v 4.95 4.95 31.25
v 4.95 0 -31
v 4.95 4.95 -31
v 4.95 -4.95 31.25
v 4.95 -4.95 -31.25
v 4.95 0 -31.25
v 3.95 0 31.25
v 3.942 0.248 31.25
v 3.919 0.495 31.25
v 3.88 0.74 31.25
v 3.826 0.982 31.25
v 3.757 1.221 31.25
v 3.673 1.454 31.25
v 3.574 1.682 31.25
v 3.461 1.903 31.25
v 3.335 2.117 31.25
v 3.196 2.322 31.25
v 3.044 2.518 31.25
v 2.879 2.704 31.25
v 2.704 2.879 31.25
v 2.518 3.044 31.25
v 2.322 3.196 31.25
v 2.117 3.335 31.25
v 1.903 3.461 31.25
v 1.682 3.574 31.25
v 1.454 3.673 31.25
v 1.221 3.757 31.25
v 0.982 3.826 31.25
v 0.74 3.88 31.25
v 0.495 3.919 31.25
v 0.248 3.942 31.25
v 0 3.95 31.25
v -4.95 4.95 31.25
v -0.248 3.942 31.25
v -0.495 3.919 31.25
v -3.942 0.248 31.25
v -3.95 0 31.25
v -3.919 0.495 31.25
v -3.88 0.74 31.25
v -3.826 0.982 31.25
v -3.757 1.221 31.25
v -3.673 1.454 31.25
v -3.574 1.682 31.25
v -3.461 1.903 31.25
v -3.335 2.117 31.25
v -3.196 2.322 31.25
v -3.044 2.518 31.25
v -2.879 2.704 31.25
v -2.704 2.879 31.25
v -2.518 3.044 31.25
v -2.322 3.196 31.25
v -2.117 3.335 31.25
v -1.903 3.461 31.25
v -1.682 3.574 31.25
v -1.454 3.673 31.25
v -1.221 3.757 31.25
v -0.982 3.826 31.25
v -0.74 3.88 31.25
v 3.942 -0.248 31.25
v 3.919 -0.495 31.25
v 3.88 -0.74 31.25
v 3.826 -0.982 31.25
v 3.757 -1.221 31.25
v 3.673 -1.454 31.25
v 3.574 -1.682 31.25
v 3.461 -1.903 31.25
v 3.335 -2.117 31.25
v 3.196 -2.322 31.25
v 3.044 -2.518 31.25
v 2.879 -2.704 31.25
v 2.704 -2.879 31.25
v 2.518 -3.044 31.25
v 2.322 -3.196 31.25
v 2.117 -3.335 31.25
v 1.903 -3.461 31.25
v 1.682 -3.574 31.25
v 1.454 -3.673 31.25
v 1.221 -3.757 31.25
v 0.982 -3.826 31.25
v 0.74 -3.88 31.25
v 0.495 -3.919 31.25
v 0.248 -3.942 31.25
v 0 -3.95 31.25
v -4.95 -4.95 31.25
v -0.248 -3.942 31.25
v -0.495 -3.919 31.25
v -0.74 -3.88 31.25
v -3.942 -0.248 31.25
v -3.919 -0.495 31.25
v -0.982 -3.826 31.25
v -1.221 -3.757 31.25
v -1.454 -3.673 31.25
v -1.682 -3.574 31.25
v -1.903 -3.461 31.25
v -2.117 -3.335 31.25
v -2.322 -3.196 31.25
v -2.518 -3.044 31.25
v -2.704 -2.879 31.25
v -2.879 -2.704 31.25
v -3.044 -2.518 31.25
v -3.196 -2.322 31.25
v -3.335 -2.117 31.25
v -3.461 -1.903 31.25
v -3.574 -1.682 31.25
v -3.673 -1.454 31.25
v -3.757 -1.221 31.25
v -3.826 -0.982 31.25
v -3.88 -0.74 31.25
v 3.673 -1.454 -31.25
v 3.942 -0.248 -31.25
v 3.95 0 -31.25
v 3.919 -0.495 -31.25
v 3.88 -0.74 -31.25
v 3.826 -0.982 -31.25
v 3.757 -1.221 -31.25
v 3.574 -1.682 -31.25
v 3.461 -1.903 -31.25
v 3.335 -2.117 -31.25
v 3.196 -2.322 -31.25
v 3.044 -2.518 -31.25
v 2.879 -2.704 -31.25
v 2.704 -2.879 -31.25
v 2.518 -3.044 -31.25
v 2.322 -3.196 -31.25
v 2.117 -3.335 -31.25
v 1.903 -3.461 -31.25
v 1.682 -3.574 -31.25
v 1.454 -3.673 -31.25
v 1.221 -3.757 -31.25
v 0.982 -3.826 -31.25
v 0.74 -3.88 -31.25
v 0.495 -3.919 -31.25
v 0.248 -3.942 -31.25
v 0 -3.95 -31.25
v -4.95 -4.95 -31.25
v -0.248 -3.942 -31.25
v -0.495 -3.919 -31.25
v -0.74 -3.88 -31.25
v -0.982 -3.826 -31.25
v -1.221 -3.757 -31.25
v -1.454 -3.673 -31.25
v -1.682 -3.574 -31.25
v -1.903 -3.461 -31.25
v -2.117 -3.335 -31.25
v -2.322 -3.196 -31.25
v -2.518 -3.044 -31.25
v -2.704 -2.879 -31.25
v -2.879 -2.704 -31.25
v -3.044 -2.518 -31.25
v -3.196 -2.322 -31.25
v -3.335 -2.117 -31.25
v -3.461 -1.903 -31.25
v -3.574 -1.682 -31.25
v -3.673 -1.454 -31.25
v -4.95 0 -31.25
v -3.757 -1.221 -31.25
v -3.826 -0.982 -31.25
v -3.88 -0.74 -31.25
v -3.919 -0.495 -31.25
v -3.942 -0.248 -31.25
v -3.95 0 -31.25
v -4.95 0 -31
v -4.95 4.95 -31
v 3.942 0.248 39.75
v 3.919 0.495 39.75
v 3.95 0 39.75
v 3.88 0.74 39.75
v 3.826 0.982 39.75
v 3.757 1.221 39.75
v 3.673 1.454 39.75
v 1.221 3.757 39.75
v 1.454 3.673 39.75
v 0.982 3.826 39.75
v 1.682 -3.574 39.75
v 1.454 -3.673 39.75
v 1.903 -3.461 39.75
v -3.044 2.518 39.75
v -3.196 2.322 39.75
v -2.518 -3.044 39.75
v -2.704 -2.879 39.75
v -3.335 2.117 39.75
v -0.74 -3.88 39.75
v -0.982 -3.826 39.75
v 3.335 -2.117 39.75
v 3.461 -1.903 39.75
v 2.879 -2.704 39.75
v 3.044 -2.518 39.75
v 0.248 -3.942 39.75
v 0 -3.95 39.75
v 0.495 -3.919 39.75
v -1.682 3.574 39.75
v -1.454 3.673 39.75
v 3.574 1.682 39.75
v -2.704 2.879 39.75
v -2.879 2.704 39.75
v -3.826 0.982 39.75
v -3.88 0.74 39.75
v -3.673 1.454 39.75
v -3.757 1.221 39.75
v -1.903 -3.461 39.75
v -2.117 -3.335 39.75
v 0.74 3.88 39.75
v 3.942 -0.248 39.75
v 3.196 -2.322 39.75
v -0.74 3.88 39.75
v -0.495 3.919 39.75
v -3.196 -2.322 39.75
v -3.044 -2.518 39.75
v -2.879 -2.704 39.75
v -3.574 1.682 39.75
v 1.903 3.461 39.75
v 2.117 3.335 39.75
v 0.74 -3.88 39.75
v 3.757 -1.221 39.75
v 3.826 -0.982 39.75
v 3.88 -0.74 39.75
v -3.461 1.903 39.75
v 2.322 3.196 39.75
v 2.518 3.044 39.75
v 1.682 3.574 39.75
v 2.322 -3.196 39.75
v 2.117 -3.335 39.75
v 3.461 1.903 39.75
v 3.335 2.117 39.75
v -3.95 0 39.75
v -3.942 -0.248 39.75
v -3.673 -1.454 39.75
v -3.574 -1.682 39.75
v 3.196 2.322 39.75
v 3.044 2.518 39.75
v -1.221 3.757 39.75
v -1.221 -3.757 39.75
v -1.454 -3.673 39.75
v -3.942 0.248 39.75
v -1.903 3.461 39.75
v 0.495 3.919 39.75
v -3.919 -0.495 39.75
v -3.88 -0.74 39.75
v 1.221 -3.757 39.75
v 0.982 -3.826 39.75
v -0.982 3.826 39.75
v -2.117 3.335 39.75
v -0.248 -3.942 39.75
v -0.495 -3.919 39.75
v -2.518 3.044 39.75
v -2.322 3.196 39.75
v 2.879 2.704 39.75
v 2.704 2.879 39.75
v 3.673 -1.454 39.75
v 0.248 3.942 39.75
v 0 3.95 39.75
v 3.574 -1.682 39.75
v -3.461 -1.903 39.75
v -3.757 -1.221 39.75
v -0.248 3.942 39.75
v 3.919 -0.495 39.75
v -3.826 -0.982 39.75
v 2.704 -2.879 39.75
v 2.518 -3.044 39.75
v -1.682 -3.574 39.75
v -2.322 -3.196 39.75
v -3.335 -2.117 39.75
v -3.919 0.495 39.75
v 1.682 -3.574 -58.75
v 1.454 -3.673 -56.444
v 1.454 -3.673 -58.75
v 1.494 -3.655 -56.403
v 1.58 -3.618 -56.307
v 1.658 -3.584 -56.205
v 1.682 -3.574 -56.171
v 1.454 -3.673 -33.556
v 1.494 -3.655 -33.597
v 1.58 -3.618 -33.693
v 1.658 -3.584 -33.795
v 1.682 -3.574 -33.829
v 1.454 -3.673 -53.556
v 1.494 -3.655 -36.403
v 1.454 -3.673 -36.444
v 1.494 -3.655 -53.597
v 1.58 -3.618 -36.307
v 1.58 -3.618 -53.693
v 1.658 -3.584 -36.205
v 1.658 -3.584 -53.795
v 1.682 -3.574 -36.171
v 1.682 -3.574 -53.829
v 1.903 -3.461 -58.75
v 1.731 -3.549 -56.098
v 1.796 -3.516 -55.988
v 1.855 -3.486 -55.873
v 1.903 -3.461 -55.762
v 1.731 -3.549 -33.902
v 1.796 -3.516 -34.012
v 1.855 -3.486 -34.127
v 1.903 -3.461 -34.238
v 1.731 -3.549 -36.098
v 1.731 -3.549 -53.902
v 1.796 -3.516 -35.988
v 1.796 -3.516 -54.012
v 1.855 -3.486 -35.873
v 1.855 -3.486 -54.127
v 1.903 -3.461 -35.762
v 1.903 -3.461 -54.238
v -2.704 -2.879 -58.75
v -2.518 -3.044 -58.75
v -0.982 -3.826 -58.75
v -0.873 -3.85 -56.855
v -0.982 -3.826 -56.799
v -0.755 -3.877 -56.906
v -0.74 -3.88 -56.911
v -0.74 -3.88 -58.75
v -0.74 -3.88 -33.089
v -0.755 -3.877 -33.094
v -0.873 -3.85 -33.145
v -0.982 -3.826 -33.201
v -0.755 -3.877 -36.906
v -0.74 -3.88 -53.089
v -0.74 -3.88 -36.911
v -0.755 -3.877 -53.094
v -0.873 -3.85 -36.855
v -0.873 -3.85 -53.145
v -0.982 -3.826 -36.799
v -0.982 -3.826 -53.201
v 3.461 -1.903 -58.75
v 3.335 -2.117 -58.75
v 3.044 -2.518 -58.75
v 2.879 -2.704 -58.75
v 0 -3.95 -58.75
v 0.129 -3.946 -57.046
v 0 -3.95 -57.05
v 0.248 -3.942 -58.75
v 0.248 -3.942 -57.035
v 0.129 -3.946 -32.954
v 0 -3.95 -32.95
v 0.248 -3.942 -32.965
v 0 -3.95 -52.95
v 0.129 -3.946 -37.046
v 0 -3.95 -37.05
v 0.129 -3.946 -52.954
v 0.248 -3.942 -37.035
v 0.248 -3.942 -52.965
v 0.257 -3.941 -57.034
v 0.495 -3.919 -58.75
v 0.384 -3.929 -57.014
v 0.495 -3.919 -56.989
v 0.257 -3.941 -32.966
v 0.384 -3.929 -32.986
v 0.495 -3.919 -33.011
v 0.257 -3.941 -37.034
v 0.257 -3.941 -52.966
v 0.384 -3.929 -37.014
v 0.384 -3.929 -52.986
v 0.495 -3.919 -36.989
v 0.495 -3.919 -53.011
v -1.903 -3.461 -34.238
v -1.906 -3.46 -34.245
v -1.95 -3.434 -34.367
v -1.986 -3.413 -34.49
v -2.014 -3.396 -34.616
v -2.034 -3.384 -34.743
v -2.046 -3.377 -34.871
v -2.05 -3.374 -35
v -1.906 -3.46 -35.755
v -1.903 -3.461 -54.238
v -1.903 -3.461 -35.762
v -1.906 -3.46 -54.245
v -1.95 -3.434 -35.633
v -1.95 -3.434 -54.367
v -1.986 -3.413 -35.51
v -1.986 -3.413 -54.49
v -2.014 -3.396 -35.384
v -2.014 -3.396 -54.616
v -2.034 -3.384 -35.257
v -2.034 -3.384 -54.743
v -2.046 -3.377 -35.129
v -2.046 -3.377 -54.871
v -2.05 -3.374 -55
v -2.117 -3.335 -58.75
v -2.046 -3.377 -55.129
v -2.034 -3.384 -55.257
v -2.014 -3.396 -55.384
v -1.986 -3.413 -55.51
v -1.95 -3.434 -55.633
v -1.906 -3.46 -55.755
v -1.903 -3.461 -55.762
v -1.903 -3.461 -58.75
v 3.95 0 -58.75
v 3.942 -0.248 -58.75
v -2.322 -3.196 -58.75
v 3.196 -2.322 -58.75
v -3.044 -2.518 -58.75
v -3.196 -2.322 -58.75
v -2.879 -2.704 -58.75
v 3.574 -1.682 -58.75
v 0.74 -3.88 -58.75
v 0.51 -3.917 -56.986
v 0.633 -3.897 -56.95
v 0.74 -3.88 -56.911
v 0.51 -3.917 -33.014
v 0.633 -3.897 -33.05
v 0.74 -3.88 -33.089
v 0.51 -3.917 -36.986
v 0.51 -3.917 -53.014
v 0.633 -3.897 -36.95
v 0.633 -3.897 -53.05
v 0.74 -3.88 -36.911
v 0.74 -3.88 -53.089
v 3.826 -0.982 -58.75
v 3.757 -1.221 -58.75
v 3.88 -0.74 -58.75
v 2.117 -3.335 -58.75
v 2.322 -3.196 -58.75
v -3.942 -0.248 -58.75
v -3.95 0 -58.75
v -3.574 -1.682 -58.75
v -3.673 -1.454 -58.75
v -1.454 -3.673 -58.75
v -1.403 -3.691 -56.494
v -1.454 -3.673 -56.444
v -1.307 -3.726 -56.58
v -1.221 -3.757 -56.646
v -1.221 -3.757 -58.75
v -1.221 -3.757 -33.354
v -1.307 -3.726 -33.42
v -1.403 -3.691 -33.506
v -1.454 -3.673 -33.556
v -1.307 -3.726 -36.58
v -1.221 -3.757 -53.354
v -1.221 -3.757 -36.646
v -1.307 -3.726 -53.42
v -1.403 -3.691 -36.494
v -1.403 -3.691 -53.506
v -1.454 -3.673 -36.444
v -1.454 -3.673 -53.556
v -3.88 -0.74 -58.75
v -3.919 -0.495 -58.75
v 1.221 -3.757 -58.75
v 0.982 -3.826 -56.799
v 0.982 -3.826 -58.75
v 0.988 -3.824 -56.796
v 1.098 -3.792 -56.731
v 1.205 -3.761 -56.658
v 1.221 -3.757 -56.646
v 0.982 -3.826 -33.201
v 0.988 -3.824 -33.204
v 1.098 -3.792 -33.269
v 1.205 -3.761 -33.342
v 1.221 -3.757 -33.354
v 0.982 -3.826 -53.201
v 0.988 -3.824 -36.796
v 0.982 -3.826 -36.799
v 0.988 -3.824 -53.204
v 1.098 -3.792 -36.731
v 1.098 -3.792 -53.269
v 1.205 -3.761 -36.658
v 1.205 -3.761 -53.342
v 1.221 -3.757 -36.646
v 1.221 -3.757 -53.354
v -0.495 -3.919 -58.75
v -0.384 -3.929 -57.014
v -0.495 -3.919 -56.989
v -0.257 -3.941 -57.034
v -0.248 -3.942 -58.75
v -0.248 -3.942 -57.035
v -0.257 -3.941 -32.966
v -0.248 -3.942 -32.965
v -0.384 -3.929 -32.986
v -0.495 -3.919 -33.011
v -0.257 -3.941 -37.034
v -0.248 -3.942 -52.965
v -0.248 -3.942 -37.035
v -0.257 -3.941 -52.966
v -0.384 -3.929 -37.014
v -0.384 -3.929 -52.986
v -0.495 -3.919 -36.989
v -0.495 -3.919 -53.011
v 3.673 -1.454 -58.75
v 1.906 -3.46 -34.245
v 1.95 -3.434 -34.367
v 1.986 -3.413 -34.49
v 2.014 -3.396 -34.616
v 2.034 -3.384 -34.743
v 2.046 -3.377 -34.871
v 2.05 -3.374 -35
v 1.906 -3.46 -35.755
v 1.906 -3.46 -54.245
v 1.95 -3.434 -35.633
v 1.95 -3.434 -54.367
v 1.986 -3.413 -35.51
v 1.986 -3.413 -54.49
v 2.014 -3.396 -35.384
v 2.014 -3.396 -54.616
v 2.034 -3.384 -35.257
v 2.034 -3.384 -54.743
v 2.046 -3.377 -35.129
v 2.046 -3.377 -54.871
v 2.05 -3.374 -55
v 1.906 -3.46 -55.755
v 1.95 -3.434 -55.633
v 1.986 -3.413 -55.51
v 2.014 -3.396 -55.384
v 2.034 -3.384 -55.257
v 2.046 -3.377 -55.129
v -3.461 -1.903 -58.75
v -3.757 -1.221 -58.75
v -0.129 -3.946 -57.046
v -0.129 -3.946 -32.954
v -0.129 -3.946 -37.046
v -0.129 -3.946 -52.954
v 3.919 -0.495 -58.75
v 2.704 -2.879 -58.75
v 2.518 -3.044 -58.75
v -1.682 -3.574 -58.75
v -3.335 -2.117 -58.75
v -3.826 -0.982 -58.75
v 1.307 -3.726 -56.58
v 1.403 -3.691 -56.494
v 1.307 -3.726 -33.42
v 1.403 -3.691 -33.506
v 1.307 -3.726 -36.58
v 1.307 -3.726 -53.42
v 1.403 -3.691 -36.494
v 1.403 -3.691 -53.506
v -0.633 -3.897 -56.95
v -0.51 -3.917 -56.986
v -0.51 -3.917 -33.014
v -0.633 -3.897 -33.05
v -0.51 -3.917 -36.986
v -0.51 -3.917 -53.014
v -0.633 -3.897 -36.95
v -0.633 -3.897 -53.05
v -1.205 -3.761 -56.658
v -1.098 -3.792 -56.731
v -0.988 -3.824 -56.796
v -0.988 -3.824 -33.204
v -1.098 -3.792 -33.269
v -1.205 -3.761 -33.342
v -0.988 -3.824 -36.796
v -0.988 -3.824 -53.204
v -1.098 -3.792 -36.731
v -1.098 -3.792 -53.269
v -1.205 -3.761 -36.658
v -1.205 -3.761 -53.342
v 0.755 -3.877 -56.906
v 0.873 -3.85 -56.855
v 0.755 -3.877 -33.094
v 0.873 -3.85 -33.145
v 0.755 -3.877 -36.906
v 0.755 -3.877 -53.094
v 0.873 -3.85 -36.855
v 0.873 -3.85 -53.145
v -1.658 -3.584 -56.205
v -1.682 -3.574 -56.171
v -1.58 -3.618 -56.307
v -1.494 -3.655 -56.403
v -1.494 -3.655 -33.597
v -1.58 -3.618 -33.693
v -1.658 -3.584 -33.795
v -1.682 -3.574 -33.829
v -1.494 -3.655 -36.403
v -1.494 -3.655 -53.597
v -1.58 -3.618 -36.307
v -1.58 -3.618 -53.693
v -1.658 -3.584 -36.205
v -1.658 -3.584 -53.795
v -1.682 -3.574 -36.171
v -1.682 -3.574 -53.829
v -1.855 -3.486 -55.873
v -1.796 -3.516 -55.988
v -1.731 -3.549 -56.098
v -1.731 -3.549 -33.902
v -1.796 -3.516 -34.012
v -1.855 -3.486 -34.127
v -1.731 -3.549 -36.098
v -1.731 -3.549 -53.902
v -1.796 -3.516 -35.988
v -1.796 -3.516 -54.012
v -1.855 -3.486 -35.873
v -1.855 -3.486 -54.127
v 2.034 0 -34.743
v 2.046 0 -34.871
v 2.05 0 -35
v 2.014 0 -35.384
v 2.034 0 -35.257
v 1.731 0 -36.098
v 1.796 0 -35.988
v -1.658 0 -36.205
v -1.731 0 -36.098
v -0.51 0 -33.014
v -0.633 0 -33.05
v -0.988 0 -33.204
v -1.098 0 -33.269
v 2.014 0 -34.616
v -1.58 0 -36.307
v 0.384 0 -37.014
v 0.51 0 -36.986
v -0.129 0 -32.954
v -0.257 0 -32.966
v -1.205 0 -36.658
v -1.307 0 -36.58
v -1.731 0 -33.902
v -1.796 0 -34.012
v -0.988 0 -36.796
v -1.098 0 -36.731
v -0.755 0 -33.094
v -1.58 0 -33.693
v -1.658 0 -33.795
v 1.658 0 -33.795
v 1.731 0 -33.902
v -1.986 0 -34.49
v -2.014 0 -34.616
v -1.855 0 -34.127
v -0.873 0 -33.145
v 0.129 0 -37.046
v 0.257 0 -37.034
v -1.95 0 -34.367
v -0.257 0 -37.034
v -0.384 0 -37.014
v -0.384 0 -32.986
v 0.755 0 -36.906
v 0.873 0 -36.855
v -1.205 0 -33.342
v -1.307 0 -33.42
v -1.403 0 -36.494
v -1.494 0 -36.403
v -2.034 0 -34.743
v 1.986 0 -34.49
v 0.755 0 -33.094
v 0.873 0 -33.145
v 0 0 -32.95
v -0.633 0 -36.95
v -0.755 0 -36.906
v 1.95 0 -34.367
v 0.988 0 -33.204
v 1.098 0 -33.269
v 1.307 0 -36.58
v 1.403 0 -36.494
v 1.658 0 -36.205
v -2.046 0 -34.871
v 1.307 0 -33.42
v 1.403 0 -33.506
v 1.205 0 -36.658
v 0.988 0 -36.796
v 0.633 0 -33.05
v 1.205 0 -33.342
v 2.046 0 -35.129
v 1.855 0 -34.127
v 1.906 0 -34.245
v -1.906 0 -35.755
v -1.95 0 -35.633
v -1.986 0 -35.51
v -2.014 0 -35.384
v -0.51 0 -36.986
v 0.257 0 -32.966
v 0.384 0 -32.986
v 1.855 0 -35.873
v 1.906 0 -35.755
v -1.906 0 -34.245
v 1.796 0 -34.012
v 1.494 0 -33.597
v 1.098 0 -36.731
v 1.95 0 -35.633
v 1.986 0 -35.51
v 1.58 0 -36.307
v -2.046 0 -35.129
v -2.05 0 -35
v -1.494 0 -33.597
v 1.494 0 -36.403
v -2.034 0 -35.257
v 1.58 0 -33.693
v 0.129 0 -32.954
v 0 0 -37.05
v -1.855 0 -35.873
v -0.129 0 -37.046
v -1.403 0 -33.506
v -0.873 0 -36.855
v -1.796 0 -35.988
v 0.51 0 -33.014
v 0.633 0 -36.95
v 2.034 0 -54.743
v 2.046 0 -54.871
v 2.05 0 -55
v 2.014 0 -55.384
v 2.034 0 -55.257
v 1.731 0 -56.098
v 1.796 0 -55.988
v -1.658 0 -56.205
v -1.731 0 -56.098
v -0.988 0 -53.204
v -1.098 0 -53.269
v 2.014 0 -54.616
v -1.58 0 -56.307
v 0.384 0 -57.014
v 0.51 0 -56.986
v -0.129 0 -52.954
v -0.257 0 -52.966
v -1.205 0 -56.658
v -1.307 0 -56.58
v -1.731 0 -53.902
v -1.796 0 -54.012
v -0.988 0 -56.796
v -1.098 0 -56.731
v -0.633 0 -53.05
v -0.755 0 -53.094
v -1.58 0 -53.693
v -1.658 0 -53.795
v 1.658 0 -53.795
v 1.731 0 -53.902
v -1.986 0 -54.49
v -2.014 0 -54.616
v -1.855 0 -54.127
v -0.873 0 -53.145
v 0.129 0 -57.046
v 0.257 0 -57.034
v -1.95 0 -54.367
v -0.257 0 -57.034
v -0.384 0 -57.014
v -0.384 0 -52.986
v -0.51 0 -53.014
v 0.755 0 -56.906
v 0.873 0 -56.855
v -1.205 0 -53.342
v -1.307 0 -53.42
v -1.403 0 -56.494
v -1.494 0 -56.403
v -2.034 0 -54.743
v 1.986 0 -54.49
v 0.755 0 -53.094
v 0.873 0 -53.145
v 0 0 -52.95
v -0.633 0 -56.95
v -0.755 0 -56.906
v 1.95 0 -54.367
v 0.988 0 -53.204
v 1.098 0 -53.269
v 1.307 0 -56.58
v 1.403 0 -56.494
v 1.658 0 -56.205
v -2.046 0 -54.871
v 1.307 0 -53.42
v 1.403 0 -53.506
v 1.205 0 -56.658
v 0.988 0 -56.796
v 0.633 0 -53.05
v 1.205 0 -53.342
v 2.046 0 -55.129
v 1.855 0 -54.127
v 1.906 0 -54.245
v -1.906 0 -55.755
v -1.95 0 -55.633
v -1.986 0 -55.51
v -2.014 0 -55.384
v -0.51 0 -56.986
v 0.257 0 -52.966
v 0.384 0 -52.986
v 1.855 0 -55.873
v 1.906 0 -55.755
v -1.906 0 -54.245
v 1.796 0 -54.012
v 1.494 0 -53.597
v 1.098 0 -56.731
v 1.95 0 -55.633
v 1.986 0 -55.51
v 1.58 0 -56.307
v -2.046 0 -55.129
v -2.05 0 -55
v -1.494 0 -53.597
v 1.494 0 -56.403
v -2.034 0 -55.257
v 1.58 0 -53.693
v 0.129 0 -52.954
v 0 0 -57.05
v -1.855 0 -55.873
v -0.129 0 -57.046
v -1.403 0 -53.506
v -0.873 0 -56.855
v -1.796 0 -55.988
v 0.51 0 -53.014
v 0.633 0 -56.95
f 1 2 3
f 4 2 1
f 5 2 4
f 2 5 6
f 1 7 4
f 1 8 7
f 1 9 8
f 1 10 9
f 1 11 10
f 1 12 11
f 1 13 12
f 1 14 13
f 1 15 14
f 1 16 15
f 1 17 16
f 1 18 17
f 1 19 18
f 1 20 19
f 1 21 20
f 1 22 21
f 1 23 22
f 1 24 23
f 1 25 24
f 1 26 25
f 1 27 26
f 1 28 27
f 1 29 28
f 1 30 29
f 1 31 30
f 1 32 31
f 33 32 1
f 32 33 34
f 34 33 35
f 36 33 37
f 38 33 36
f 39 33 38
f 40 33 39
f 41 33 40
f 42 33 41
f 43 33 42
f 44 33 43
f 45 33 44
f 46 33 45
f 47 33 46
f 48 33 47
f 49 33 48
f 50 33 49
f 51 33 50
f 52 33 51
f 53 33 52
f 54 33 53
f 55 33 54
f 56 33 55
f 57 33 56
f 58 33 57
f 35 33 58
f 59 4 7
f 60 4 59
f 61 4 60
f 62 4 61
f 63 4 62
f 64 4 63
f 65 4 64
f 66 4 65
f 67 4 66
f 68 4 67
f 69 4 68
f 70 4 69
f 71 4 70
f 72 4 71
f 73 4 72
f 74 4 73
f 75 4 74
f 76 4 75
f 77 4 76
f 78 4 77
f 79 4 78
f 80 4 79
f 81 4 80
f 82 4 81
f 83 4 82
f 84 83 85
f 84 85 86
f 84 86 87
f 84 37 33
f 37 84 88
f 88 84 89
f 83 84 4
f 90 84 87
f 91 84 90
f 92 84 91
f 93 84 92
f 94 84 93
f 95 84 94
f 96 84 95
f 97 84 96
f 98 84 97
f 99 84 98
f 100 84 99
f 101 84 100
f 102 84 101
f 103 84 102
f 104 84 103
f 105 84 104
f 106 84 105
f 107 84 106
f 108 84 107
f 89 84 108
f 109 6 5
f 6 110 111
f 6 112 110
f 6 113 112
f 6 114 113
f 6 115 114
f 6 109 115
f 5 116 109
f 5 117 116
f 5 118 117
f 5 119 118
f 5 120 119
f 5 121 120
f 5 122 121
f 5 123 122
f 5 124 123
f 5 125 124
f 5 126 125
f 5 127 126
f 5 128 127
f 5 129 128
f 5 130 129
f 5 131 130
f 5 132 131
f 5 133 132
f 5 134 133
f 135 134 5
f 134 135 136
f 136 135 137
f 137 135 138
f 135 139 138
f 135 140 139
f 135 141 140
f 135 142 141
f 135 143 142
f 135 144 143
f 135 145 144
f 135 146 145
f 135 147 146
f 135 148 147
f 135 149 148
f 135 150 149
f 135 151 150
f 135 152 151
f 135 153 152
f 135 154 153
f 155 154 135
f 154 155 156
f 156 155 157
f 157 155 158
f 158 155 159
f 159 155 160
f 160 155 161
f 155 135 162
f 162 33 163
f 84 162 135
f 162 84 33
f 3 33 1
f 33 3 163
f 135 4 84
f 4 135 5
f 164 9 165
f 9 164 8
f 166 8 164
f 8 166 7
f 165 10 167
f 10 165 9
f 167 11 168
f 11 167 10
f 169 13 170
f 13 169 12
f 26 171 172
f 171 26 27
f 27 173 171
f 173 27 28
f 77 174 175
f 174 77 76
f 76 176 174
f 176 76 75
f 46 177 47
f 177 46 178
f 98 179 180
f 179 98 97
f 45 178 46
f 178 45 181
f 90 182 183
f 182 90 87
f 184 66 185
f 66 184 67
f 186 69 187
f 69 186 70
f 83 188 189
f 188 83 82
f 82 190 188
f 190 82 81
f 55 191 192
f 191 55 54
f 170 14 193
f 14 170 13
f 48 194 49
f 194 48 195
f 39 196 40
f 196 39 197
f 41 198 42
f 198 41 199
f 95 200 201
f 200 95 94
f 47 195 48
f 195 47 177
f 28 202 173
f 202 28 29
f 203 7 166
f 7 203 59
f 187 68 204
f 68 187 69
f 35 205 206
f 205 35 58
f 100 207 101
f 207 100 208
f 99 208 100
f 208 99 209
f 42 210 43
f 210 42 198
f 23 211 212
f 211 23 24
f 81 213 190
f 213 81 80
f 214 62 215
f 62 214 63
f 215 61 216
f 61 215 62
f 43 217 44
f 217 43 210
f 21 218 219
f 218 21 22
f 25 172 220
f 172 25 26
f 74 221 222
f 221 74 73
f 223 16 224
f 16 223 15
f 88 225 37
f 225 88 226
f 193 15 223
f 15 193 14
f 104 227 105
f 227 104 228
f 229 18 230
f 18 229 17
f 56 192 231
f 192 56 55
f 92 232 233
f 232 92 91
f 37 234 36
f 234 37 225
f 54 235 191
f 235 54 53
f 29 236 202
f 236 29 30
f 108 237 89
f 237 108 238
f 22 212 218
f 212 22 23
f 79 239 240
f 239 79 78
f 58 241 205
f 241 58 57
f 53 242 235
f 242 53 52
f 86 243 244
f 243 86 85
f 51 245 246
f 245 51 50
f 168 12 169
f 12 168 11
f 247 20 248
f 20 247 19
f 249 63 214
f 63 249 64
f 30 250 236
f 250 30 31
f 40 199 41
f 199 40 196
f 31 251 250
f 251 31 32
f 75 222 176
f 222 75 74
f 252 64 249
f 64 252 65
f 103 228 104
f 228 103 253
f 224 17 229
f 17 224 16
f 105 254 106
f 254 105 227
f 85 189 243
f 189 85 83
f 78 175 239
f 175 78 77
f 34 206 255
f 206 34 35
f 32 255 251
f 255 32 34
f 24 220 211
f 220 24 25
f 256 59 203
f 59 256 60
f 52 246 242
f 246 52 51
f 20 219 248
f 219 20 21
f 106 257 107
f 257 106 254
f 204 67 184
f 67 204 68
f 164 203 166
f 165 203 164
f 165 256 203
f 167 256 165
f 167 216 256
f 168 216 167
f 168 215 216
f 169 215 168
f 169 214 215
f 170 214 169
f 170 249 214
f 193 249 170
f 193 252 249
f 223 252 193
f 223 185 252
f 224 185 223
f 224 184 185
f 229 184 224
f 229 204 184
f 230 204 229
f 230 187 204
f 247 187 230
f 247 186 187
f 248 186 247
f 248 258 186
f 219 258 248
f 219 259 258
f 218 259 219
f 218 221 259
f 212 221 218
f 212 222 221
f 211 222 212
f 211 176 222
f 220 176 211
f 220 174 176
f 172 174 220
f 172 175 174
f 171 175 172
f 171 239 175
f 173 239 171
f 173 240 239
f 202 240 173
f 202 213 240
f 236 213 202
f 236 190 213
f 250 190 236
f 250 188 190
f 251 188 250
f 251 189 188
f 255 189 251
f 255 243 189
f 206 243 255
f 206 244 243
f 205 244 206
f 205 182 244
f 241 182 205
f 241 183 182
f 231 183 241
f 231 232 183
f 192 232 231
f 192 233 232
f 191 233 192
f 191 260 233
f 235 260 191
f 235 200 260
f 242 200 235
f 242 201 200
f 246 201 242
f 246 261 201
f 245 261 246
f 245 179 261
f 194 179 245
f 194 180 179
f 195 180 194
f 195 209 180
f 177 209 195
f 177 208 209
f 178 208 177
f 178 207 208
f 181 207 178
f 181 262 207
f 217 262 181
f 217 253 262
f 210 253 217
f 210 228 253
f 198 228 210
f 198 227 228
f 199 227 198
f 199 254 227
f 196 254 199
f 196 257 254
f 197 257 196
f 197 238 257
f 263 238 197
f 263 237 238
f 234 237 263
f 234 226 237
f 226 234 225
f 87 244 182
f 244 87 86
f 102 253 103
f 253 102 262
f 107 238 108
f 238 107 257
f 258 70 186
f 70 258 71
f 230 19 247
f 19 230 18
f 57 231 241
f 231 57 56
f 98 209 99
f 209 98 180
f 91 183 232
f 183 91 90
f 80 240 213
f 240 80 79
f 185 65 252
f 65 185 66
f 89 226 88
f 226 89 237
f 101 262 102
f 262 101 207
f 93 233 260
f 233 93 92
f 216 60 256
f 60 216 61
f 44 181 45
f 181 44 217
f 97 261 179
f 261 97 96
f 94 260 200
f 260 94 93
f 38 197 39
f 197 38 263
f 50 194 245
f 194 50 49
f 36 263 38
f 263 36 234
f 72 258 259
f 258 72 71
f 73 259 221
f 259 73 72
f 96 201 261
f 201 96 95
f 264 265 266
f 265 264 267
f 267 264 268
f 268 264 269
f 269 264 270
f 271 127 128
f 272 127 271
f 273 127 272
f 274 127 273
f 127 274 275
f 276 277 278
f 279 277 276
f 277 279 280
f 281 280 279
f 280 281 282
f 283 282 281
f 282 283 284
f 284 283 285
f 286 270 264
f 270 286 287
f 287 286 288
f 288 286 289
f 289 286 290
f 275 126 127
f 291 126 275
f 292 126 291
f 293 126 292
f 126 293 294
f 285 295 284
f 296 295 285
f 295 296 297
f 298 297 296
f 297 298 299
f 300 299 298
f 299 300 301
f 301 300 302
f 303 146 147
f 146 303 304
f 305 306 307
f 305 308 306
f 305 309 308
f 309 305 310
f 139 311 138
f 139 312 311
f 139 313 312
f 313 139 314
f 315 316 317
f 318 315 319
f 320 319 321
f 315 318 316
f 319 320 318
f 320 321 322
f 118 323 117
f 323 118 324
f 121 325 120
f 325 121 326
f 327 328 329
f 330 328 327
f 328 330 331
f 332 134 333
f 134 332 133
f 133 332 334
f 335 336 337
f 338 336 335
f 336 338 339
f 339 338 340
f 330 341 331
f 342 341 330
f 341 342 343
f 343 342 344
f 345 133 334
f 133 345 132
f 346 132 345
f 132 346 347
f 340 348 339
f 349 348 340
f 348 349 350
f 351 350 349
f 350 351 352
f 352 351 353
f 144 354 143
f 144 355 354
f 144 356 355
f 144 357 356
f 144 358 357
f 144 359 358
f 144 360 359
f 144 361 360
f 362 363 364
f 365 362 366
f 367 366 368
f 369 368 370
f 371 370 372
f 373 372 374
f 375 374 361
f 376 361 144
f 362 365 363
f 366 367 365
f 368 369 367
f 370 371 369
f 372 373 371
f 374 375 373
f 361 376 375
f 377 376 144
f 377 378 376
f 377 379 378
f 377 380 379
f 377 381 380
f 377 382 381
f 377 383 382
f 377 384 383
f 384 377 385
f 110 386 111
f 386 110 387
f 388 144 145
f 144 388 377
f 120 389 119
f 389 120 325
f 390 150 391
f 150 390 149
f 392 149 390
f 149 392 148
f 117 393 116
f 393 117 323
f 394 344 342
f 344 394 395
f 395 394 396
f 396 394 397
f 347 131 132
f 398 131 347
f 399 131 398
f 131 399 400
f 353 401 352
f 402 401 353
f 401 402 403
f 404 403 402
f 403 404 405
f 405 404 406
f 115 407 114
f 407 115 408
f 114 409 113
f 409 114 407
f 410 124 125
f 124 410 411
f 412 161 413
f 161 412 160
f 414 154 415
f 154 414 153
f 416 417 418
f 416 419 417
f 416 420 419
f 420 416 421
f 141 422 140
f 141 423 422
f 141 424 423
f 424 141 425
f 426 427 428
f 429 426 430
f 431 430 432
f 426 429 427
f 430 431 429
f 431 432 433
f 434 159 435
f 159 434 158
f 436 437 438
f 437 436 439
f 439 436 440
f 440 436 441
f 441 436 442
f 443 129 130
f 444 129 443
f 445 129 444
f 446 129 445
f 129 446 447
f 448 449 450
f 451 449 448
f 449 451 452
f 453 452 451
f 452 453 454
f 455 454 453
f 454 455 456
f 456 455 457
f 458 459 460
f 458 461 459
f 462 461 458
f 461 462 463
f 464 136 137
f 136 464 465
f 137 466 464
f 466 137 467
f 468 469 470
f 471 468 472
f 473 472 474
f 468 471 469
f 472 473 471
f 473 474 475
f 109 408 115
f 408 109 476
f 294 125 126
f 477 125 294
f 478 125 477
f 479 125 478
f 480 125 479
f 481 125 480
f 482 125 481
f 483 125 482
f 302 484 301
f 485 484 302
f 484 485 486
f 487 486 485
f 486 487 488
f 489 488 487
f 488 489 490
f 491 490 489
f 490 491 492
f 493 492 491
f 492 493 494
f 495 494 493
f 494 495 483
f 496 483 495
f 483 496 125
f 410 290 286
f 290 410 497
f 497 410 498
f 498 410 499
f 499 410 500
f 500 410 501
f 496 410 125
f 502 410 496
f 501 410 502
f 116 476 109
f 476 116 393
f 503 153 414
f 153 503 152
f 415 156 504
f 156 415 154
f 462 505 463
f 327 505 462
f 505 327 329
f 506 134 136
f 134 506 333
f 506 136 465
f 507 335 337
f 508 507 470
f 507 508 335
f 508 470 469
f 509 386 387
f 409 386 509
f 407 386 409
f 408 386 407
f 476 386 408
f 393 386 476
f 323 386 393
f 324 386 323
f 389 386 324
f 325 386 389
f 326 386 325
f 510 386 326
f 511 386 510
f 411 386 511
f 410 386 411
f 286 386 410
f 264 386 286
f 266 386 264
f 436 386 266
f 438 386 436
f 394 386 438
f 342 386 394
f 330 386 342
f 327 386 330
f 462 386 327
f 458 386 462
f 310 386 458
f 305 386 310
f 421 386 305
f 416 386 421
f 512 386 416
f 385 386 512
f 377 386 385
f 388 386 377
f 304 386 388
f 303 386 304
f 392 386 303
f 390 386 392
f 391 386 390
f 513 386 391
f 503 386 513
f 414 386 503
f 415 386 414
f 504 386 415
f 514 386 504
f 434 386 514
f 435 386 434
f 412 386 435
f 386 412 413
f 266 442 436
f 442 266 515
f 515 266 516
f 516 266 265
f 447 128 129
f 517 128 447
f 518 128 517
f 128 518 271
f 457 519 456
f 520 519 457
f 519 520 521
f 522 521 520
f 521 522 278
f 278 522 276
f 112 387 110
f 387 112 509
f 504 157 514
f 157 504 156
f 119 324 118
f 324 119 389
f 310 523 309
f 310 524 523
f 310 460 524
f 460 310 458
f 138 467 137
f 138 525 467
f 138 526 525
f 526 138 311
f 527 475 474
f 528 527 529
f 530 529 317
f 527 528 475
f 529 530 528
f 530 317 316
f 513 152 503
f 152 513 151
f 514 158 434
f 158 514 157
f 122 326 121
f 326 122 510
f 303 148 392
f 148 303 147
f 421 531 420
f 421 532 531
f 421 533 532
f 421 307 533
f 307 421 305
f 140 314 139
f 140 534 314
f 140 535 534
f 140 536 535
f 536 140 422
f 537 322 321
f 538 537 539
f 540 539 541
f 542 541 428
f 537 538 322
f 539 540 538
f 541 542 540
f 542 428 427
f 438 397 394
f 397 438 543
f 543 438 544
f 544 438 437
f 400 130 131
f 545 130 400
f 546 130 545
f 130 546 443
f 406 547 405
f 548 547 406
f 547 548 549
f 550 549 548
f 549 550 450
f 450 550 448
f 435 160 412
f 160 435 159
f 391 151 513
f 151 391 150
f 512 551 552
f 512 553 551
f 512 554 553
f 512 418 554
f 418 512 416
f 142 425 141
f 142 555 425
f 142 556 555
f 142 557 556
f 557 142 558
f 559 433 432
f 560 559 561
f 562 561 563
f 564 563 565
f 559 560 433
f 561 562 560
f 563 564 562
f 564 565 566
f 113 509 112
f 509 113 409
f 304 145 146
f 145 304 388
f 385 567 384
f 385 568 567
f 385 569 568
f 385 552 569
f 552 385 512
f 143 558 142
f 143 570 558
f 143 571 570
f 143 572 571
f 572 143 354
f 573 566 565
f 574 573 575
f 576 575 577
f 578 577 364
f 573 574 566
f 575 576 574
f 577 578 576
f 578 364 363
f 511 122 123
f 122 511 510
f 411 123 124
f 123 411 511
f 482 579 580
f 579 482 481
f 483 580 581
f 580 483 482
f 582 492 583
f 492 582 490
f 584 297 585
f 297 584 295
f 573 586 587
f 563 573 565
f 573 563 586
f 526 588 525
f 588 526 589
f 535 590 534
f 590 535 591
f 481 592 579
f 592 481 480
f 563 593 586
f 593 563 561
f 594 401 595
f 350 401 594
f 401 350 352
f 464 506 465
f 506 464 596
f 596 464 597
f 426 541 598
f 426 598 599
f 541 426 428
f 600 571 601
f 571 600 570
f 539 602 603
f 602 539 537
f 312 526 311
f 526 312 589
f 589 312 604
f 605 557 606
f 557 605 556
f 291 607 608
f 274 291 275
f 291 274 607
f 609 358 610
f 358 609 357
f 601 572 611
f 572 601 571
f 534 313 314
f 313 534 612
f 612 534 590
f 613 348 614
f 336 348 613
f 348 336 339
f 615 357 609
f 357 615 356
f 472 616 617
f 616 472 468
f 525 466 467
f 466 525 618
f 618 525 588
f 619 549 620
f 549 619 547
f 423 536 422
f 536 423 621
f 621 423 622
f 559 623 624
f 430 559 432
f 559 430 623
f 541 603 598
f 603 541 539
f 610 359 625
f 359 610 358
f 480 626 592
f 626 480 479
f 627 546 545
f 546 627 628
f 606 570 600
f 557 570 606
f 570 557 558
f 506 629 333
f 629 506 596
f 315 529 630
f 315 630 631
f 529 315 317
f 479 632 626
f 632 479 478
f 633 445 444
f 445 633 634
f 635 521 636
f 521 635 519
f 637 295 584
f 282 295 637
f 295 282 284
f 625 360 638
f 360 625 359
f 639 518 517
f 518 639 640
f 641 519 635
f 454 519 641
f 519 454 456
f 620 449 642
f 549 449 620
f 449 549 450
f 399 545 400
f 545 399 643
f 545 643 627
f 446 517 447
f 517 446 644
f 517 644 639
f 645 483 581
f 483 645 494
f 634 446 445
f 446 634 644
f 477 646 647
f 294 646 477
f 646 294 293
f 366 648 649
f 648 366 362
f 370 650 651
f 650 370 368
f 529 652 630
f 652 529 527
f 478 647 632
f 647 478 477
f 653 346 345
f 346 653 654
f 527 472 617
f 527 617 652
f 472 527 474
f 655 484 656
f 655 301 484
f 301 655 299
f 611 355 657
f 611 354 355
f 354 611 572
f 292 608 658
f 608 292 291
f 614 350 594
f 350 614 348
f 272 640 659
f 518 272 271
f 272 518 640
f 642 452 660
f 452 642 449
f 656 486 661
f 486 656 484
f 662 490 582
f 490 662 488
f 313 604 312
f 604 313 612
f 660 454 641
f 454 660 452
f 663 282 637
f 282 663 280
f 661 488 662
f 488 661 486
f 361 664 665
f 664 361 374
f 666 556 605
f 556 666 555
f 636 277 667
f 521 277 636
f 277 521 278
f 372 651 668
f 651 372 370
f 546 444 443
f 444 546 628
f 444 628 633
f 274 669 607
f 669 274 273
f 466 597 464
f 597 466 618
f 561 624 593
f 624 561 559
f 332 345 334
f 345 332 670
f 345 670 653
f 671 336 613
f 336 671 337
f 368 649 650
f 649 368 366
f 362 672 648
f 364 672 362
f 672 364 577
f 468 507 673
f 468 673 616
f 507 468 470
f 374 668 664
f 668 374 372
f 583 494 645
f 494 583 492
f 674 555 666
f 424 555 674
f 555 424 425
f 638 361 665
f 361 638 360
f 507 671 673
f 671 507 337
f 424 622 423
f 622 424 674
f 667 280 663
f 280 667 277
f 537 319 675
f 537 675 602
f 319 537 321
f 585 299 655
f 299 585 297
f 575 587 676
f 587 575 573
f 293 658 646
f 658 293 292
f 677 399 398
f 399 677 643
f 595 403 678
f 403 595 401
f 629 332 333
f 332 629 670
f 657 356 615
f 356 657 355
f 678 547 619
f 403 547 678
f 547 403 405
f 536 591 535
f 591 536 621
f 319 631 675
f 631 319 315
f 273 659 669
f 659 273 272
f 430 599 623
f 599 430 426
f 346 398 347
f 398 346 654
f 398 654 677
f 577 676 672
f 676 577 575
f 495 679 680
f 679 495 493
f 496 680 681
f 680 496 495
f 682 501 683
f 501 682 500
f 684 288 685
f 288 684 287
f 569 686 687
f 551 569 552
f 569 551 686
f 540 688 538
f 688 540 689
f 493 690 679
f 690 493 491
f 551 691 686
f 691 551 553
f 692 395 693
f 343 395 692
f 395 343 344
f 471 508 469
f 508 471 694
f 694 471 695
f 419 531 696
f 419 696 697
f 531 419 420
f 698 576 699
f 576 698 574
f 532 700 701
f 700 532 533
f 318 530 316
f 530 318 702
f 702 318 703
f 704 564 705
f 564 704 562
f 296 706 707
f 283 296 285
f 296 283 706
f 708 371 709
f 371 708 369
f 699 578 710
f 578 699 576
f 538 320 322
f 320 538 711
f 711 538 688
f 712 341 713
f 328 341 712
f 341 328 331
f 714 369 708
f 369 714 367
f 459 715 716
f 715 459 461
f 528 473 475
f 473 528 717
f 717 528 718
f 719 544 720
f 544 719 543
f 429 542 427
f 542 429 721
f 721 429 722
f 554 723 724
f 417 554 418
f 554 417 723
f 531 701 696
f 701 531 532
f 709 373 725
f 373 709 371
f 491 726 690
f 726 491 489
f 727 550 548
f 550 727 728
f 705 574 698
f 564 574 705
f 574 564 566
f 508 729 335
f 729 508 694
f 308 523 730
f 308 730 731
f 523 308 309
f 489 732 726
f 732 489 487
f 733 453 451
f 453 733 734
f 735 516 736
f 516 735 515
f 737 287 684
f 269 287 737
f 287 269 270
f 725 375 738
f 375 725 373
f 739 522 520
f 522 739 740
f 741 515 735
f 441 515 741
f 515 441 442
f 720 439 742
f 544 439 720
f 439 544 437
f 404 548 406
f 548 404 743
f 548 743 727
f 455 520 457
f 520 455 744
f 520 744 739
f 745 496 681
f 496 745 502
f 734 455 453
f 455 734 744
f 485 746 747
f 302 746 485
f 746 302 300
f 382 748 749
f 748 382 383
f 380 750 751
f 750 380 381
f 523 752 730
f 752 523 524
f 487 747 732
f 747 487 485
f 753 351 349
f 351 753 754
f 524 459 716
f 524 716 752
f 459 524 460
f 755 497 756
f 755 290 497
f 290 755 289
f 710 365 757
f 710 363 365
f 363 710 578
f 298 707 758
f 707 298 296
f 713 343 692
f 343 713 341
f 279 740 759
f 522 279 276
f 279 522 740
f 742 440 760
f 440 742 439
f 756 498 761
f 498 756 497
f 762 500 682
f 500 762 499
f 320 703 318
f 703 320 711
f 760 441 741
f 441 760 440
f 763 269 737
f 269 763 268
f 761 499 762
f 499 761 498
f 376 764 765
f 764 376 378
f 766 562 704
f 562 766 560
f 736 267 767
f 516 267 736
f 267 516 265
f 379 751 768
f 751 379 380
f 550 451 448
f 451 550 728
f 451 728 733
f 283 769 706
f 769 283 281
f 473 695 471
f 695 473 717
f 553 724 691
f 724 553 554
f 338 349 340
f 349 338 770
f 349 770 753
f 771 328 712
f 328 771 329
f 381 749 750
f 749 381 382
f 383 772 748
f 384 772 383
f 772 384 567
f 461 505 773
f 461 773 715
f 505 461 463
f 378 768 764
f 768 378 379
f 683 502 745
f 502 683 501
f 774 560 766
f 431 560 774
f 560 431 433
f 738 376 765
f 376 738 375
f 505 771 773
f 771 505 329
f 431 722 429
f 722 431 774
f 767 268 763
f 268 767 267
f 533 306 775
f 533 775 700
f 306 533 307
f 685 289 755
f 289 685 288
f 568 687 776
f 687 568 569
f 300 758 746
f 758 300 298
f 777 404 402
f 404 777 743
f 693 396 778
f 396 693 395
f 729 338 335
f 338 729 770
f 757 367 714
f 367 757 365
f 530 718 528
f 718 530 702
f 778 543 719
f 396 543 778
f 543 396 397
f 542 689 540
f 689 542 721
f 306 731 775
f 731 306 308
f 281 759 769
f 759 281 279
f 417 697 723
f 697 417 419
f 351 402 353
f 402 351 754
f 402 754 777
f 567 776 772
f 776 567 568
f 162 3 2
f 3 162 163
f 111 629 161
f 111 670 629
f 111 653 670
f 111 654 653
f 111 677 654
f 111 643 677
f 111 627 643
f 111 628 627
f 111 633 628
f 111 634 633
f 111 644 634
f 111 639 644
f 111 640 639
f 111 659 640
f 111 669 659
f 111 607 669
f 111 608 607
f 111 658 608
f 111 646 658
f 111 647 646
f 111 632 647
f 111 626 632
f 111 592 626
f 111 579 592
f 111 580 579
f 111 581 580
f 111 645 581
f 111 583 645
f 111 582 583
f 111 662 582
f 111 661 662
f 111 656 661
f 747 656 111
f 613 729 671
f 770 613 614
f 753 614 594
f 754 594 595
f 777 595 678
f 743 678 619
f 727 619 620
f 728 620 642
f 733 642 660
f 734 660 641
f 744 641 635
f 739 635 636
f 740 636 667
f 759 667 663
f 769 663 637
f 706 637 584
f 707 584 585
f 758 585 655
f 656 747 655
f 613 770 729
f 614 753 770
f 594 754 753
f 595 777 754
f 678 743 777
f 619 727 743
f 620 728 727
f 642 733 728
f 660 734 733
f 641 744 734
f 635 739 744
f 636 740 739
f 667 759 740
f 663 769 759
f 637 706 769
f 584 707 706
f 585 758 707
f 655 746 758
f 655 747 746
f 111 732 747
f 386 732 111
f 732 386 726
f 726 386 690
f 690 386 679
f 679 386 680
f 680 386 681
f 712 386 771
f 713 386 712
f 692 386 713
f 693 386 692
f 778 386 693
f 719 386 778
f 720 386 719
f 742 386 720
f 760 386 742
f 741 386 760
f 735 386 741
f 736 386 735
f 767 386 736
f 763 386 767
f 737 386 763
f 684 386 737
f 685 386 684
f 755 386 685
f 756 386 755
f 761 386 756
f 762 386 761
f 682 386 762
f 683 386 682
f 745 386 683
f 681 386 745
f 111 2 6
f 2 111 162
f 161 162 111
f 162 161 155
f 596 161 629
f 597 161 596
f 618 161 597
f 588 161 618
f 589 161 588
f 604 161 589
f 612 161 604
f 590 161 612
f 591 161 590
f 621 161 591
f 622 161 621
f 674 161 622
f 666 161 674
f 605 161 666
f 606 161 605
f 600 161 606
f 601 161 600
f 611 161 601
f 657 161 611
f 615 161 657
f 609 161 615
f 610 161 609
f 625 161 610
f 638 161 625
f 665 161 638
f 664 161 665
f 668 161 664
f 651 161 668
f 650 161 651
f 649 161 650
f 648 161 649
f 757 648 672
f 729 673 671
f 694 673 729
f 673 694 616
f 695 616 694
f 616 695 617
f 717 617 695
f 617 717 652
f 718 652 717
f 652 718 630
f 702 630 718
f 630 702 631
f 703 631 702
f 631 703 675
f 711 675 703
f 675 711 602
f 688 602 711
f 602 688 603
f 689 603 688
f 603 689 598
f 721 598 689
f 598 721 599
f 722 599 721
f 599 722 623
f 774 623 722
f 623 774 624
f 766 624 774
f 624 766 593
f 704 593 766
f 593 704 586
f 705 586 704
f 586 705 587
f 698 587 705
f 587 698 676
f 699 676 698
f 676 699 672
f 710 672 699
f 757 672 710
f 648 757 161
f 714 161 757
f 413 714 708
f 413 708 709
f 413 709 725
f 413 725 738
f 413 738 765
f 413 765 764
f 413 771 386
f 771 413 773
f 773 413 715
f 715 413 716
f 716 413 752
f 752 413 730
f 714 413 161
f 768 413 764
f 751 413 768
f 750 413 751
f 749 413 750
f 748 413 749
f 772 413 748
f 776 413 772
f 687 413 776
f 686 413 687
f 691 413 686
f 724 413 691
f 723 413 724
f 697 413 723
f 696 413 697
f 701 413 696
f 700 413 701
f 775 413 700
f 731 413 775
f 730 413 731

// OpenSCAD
include <./modules.scad>;

// axe du premier barillet pour la partie sonnerie

piece = 1;

if (piece == 1)
{
    difference()
    {
        union()
        {
            cube([2*ep_axe-jeu_axe,2*ep_axe-jeu_axe,l/2*echelle],center=true);
            translate([0,0,(l*echelle/4)+ep_cadre*echelle/2])  cylinder(r=ep_roulement-jeu_axe/2,h=10,$fn=100,center=true);
            translate([0,0,-(l*echelle/4)-ep_cadre*echelle/2+1])  cylinder(r=ep_roulement-jeu_axe/2,h=50,$fn=100,center=true);
        }

        translate([0,0,-35]) rotate([90,0,0])    cylinder(r=2.05,h=30,$fn=100,center=true);
        translate([0,0,-55]) rotate([90,0,0])    cylinder(r=2.05,h=30,$fn=100,center=true);    
        translate([-5,0,-59]) cube([10,10,28]);
    }
}

if (piece ==2)
{
color([1,0,0])
    difference()
    {
        union()
        {
            translate([0,0,-(l*echelle/4)-ep_cadre*echelle/2-12])  cylinder(r=ep_roulement-jeu_axe/2,h=30,$fn=100,center=true);
            translate([0,0,-(l/2*echelle+l/ep_cadre*echelle)/2-ep_cadre/2-25]) cube([2*ep_axe,2*ep_axe,2*l/ep_cadre*echelle],center=true);
        }

        translate([0,0,-35]) rotate([90,0,0])    cylinder(r=2.05,h=30,$fn=100,center=true);
        translate([0,0,-55]) rotate([90,0,0])    cylinder(r=2.05,h=30,$fn=100,center=true);    
        translate([-5,-10,-59]) cube([10,10,28]);    
    }
}
